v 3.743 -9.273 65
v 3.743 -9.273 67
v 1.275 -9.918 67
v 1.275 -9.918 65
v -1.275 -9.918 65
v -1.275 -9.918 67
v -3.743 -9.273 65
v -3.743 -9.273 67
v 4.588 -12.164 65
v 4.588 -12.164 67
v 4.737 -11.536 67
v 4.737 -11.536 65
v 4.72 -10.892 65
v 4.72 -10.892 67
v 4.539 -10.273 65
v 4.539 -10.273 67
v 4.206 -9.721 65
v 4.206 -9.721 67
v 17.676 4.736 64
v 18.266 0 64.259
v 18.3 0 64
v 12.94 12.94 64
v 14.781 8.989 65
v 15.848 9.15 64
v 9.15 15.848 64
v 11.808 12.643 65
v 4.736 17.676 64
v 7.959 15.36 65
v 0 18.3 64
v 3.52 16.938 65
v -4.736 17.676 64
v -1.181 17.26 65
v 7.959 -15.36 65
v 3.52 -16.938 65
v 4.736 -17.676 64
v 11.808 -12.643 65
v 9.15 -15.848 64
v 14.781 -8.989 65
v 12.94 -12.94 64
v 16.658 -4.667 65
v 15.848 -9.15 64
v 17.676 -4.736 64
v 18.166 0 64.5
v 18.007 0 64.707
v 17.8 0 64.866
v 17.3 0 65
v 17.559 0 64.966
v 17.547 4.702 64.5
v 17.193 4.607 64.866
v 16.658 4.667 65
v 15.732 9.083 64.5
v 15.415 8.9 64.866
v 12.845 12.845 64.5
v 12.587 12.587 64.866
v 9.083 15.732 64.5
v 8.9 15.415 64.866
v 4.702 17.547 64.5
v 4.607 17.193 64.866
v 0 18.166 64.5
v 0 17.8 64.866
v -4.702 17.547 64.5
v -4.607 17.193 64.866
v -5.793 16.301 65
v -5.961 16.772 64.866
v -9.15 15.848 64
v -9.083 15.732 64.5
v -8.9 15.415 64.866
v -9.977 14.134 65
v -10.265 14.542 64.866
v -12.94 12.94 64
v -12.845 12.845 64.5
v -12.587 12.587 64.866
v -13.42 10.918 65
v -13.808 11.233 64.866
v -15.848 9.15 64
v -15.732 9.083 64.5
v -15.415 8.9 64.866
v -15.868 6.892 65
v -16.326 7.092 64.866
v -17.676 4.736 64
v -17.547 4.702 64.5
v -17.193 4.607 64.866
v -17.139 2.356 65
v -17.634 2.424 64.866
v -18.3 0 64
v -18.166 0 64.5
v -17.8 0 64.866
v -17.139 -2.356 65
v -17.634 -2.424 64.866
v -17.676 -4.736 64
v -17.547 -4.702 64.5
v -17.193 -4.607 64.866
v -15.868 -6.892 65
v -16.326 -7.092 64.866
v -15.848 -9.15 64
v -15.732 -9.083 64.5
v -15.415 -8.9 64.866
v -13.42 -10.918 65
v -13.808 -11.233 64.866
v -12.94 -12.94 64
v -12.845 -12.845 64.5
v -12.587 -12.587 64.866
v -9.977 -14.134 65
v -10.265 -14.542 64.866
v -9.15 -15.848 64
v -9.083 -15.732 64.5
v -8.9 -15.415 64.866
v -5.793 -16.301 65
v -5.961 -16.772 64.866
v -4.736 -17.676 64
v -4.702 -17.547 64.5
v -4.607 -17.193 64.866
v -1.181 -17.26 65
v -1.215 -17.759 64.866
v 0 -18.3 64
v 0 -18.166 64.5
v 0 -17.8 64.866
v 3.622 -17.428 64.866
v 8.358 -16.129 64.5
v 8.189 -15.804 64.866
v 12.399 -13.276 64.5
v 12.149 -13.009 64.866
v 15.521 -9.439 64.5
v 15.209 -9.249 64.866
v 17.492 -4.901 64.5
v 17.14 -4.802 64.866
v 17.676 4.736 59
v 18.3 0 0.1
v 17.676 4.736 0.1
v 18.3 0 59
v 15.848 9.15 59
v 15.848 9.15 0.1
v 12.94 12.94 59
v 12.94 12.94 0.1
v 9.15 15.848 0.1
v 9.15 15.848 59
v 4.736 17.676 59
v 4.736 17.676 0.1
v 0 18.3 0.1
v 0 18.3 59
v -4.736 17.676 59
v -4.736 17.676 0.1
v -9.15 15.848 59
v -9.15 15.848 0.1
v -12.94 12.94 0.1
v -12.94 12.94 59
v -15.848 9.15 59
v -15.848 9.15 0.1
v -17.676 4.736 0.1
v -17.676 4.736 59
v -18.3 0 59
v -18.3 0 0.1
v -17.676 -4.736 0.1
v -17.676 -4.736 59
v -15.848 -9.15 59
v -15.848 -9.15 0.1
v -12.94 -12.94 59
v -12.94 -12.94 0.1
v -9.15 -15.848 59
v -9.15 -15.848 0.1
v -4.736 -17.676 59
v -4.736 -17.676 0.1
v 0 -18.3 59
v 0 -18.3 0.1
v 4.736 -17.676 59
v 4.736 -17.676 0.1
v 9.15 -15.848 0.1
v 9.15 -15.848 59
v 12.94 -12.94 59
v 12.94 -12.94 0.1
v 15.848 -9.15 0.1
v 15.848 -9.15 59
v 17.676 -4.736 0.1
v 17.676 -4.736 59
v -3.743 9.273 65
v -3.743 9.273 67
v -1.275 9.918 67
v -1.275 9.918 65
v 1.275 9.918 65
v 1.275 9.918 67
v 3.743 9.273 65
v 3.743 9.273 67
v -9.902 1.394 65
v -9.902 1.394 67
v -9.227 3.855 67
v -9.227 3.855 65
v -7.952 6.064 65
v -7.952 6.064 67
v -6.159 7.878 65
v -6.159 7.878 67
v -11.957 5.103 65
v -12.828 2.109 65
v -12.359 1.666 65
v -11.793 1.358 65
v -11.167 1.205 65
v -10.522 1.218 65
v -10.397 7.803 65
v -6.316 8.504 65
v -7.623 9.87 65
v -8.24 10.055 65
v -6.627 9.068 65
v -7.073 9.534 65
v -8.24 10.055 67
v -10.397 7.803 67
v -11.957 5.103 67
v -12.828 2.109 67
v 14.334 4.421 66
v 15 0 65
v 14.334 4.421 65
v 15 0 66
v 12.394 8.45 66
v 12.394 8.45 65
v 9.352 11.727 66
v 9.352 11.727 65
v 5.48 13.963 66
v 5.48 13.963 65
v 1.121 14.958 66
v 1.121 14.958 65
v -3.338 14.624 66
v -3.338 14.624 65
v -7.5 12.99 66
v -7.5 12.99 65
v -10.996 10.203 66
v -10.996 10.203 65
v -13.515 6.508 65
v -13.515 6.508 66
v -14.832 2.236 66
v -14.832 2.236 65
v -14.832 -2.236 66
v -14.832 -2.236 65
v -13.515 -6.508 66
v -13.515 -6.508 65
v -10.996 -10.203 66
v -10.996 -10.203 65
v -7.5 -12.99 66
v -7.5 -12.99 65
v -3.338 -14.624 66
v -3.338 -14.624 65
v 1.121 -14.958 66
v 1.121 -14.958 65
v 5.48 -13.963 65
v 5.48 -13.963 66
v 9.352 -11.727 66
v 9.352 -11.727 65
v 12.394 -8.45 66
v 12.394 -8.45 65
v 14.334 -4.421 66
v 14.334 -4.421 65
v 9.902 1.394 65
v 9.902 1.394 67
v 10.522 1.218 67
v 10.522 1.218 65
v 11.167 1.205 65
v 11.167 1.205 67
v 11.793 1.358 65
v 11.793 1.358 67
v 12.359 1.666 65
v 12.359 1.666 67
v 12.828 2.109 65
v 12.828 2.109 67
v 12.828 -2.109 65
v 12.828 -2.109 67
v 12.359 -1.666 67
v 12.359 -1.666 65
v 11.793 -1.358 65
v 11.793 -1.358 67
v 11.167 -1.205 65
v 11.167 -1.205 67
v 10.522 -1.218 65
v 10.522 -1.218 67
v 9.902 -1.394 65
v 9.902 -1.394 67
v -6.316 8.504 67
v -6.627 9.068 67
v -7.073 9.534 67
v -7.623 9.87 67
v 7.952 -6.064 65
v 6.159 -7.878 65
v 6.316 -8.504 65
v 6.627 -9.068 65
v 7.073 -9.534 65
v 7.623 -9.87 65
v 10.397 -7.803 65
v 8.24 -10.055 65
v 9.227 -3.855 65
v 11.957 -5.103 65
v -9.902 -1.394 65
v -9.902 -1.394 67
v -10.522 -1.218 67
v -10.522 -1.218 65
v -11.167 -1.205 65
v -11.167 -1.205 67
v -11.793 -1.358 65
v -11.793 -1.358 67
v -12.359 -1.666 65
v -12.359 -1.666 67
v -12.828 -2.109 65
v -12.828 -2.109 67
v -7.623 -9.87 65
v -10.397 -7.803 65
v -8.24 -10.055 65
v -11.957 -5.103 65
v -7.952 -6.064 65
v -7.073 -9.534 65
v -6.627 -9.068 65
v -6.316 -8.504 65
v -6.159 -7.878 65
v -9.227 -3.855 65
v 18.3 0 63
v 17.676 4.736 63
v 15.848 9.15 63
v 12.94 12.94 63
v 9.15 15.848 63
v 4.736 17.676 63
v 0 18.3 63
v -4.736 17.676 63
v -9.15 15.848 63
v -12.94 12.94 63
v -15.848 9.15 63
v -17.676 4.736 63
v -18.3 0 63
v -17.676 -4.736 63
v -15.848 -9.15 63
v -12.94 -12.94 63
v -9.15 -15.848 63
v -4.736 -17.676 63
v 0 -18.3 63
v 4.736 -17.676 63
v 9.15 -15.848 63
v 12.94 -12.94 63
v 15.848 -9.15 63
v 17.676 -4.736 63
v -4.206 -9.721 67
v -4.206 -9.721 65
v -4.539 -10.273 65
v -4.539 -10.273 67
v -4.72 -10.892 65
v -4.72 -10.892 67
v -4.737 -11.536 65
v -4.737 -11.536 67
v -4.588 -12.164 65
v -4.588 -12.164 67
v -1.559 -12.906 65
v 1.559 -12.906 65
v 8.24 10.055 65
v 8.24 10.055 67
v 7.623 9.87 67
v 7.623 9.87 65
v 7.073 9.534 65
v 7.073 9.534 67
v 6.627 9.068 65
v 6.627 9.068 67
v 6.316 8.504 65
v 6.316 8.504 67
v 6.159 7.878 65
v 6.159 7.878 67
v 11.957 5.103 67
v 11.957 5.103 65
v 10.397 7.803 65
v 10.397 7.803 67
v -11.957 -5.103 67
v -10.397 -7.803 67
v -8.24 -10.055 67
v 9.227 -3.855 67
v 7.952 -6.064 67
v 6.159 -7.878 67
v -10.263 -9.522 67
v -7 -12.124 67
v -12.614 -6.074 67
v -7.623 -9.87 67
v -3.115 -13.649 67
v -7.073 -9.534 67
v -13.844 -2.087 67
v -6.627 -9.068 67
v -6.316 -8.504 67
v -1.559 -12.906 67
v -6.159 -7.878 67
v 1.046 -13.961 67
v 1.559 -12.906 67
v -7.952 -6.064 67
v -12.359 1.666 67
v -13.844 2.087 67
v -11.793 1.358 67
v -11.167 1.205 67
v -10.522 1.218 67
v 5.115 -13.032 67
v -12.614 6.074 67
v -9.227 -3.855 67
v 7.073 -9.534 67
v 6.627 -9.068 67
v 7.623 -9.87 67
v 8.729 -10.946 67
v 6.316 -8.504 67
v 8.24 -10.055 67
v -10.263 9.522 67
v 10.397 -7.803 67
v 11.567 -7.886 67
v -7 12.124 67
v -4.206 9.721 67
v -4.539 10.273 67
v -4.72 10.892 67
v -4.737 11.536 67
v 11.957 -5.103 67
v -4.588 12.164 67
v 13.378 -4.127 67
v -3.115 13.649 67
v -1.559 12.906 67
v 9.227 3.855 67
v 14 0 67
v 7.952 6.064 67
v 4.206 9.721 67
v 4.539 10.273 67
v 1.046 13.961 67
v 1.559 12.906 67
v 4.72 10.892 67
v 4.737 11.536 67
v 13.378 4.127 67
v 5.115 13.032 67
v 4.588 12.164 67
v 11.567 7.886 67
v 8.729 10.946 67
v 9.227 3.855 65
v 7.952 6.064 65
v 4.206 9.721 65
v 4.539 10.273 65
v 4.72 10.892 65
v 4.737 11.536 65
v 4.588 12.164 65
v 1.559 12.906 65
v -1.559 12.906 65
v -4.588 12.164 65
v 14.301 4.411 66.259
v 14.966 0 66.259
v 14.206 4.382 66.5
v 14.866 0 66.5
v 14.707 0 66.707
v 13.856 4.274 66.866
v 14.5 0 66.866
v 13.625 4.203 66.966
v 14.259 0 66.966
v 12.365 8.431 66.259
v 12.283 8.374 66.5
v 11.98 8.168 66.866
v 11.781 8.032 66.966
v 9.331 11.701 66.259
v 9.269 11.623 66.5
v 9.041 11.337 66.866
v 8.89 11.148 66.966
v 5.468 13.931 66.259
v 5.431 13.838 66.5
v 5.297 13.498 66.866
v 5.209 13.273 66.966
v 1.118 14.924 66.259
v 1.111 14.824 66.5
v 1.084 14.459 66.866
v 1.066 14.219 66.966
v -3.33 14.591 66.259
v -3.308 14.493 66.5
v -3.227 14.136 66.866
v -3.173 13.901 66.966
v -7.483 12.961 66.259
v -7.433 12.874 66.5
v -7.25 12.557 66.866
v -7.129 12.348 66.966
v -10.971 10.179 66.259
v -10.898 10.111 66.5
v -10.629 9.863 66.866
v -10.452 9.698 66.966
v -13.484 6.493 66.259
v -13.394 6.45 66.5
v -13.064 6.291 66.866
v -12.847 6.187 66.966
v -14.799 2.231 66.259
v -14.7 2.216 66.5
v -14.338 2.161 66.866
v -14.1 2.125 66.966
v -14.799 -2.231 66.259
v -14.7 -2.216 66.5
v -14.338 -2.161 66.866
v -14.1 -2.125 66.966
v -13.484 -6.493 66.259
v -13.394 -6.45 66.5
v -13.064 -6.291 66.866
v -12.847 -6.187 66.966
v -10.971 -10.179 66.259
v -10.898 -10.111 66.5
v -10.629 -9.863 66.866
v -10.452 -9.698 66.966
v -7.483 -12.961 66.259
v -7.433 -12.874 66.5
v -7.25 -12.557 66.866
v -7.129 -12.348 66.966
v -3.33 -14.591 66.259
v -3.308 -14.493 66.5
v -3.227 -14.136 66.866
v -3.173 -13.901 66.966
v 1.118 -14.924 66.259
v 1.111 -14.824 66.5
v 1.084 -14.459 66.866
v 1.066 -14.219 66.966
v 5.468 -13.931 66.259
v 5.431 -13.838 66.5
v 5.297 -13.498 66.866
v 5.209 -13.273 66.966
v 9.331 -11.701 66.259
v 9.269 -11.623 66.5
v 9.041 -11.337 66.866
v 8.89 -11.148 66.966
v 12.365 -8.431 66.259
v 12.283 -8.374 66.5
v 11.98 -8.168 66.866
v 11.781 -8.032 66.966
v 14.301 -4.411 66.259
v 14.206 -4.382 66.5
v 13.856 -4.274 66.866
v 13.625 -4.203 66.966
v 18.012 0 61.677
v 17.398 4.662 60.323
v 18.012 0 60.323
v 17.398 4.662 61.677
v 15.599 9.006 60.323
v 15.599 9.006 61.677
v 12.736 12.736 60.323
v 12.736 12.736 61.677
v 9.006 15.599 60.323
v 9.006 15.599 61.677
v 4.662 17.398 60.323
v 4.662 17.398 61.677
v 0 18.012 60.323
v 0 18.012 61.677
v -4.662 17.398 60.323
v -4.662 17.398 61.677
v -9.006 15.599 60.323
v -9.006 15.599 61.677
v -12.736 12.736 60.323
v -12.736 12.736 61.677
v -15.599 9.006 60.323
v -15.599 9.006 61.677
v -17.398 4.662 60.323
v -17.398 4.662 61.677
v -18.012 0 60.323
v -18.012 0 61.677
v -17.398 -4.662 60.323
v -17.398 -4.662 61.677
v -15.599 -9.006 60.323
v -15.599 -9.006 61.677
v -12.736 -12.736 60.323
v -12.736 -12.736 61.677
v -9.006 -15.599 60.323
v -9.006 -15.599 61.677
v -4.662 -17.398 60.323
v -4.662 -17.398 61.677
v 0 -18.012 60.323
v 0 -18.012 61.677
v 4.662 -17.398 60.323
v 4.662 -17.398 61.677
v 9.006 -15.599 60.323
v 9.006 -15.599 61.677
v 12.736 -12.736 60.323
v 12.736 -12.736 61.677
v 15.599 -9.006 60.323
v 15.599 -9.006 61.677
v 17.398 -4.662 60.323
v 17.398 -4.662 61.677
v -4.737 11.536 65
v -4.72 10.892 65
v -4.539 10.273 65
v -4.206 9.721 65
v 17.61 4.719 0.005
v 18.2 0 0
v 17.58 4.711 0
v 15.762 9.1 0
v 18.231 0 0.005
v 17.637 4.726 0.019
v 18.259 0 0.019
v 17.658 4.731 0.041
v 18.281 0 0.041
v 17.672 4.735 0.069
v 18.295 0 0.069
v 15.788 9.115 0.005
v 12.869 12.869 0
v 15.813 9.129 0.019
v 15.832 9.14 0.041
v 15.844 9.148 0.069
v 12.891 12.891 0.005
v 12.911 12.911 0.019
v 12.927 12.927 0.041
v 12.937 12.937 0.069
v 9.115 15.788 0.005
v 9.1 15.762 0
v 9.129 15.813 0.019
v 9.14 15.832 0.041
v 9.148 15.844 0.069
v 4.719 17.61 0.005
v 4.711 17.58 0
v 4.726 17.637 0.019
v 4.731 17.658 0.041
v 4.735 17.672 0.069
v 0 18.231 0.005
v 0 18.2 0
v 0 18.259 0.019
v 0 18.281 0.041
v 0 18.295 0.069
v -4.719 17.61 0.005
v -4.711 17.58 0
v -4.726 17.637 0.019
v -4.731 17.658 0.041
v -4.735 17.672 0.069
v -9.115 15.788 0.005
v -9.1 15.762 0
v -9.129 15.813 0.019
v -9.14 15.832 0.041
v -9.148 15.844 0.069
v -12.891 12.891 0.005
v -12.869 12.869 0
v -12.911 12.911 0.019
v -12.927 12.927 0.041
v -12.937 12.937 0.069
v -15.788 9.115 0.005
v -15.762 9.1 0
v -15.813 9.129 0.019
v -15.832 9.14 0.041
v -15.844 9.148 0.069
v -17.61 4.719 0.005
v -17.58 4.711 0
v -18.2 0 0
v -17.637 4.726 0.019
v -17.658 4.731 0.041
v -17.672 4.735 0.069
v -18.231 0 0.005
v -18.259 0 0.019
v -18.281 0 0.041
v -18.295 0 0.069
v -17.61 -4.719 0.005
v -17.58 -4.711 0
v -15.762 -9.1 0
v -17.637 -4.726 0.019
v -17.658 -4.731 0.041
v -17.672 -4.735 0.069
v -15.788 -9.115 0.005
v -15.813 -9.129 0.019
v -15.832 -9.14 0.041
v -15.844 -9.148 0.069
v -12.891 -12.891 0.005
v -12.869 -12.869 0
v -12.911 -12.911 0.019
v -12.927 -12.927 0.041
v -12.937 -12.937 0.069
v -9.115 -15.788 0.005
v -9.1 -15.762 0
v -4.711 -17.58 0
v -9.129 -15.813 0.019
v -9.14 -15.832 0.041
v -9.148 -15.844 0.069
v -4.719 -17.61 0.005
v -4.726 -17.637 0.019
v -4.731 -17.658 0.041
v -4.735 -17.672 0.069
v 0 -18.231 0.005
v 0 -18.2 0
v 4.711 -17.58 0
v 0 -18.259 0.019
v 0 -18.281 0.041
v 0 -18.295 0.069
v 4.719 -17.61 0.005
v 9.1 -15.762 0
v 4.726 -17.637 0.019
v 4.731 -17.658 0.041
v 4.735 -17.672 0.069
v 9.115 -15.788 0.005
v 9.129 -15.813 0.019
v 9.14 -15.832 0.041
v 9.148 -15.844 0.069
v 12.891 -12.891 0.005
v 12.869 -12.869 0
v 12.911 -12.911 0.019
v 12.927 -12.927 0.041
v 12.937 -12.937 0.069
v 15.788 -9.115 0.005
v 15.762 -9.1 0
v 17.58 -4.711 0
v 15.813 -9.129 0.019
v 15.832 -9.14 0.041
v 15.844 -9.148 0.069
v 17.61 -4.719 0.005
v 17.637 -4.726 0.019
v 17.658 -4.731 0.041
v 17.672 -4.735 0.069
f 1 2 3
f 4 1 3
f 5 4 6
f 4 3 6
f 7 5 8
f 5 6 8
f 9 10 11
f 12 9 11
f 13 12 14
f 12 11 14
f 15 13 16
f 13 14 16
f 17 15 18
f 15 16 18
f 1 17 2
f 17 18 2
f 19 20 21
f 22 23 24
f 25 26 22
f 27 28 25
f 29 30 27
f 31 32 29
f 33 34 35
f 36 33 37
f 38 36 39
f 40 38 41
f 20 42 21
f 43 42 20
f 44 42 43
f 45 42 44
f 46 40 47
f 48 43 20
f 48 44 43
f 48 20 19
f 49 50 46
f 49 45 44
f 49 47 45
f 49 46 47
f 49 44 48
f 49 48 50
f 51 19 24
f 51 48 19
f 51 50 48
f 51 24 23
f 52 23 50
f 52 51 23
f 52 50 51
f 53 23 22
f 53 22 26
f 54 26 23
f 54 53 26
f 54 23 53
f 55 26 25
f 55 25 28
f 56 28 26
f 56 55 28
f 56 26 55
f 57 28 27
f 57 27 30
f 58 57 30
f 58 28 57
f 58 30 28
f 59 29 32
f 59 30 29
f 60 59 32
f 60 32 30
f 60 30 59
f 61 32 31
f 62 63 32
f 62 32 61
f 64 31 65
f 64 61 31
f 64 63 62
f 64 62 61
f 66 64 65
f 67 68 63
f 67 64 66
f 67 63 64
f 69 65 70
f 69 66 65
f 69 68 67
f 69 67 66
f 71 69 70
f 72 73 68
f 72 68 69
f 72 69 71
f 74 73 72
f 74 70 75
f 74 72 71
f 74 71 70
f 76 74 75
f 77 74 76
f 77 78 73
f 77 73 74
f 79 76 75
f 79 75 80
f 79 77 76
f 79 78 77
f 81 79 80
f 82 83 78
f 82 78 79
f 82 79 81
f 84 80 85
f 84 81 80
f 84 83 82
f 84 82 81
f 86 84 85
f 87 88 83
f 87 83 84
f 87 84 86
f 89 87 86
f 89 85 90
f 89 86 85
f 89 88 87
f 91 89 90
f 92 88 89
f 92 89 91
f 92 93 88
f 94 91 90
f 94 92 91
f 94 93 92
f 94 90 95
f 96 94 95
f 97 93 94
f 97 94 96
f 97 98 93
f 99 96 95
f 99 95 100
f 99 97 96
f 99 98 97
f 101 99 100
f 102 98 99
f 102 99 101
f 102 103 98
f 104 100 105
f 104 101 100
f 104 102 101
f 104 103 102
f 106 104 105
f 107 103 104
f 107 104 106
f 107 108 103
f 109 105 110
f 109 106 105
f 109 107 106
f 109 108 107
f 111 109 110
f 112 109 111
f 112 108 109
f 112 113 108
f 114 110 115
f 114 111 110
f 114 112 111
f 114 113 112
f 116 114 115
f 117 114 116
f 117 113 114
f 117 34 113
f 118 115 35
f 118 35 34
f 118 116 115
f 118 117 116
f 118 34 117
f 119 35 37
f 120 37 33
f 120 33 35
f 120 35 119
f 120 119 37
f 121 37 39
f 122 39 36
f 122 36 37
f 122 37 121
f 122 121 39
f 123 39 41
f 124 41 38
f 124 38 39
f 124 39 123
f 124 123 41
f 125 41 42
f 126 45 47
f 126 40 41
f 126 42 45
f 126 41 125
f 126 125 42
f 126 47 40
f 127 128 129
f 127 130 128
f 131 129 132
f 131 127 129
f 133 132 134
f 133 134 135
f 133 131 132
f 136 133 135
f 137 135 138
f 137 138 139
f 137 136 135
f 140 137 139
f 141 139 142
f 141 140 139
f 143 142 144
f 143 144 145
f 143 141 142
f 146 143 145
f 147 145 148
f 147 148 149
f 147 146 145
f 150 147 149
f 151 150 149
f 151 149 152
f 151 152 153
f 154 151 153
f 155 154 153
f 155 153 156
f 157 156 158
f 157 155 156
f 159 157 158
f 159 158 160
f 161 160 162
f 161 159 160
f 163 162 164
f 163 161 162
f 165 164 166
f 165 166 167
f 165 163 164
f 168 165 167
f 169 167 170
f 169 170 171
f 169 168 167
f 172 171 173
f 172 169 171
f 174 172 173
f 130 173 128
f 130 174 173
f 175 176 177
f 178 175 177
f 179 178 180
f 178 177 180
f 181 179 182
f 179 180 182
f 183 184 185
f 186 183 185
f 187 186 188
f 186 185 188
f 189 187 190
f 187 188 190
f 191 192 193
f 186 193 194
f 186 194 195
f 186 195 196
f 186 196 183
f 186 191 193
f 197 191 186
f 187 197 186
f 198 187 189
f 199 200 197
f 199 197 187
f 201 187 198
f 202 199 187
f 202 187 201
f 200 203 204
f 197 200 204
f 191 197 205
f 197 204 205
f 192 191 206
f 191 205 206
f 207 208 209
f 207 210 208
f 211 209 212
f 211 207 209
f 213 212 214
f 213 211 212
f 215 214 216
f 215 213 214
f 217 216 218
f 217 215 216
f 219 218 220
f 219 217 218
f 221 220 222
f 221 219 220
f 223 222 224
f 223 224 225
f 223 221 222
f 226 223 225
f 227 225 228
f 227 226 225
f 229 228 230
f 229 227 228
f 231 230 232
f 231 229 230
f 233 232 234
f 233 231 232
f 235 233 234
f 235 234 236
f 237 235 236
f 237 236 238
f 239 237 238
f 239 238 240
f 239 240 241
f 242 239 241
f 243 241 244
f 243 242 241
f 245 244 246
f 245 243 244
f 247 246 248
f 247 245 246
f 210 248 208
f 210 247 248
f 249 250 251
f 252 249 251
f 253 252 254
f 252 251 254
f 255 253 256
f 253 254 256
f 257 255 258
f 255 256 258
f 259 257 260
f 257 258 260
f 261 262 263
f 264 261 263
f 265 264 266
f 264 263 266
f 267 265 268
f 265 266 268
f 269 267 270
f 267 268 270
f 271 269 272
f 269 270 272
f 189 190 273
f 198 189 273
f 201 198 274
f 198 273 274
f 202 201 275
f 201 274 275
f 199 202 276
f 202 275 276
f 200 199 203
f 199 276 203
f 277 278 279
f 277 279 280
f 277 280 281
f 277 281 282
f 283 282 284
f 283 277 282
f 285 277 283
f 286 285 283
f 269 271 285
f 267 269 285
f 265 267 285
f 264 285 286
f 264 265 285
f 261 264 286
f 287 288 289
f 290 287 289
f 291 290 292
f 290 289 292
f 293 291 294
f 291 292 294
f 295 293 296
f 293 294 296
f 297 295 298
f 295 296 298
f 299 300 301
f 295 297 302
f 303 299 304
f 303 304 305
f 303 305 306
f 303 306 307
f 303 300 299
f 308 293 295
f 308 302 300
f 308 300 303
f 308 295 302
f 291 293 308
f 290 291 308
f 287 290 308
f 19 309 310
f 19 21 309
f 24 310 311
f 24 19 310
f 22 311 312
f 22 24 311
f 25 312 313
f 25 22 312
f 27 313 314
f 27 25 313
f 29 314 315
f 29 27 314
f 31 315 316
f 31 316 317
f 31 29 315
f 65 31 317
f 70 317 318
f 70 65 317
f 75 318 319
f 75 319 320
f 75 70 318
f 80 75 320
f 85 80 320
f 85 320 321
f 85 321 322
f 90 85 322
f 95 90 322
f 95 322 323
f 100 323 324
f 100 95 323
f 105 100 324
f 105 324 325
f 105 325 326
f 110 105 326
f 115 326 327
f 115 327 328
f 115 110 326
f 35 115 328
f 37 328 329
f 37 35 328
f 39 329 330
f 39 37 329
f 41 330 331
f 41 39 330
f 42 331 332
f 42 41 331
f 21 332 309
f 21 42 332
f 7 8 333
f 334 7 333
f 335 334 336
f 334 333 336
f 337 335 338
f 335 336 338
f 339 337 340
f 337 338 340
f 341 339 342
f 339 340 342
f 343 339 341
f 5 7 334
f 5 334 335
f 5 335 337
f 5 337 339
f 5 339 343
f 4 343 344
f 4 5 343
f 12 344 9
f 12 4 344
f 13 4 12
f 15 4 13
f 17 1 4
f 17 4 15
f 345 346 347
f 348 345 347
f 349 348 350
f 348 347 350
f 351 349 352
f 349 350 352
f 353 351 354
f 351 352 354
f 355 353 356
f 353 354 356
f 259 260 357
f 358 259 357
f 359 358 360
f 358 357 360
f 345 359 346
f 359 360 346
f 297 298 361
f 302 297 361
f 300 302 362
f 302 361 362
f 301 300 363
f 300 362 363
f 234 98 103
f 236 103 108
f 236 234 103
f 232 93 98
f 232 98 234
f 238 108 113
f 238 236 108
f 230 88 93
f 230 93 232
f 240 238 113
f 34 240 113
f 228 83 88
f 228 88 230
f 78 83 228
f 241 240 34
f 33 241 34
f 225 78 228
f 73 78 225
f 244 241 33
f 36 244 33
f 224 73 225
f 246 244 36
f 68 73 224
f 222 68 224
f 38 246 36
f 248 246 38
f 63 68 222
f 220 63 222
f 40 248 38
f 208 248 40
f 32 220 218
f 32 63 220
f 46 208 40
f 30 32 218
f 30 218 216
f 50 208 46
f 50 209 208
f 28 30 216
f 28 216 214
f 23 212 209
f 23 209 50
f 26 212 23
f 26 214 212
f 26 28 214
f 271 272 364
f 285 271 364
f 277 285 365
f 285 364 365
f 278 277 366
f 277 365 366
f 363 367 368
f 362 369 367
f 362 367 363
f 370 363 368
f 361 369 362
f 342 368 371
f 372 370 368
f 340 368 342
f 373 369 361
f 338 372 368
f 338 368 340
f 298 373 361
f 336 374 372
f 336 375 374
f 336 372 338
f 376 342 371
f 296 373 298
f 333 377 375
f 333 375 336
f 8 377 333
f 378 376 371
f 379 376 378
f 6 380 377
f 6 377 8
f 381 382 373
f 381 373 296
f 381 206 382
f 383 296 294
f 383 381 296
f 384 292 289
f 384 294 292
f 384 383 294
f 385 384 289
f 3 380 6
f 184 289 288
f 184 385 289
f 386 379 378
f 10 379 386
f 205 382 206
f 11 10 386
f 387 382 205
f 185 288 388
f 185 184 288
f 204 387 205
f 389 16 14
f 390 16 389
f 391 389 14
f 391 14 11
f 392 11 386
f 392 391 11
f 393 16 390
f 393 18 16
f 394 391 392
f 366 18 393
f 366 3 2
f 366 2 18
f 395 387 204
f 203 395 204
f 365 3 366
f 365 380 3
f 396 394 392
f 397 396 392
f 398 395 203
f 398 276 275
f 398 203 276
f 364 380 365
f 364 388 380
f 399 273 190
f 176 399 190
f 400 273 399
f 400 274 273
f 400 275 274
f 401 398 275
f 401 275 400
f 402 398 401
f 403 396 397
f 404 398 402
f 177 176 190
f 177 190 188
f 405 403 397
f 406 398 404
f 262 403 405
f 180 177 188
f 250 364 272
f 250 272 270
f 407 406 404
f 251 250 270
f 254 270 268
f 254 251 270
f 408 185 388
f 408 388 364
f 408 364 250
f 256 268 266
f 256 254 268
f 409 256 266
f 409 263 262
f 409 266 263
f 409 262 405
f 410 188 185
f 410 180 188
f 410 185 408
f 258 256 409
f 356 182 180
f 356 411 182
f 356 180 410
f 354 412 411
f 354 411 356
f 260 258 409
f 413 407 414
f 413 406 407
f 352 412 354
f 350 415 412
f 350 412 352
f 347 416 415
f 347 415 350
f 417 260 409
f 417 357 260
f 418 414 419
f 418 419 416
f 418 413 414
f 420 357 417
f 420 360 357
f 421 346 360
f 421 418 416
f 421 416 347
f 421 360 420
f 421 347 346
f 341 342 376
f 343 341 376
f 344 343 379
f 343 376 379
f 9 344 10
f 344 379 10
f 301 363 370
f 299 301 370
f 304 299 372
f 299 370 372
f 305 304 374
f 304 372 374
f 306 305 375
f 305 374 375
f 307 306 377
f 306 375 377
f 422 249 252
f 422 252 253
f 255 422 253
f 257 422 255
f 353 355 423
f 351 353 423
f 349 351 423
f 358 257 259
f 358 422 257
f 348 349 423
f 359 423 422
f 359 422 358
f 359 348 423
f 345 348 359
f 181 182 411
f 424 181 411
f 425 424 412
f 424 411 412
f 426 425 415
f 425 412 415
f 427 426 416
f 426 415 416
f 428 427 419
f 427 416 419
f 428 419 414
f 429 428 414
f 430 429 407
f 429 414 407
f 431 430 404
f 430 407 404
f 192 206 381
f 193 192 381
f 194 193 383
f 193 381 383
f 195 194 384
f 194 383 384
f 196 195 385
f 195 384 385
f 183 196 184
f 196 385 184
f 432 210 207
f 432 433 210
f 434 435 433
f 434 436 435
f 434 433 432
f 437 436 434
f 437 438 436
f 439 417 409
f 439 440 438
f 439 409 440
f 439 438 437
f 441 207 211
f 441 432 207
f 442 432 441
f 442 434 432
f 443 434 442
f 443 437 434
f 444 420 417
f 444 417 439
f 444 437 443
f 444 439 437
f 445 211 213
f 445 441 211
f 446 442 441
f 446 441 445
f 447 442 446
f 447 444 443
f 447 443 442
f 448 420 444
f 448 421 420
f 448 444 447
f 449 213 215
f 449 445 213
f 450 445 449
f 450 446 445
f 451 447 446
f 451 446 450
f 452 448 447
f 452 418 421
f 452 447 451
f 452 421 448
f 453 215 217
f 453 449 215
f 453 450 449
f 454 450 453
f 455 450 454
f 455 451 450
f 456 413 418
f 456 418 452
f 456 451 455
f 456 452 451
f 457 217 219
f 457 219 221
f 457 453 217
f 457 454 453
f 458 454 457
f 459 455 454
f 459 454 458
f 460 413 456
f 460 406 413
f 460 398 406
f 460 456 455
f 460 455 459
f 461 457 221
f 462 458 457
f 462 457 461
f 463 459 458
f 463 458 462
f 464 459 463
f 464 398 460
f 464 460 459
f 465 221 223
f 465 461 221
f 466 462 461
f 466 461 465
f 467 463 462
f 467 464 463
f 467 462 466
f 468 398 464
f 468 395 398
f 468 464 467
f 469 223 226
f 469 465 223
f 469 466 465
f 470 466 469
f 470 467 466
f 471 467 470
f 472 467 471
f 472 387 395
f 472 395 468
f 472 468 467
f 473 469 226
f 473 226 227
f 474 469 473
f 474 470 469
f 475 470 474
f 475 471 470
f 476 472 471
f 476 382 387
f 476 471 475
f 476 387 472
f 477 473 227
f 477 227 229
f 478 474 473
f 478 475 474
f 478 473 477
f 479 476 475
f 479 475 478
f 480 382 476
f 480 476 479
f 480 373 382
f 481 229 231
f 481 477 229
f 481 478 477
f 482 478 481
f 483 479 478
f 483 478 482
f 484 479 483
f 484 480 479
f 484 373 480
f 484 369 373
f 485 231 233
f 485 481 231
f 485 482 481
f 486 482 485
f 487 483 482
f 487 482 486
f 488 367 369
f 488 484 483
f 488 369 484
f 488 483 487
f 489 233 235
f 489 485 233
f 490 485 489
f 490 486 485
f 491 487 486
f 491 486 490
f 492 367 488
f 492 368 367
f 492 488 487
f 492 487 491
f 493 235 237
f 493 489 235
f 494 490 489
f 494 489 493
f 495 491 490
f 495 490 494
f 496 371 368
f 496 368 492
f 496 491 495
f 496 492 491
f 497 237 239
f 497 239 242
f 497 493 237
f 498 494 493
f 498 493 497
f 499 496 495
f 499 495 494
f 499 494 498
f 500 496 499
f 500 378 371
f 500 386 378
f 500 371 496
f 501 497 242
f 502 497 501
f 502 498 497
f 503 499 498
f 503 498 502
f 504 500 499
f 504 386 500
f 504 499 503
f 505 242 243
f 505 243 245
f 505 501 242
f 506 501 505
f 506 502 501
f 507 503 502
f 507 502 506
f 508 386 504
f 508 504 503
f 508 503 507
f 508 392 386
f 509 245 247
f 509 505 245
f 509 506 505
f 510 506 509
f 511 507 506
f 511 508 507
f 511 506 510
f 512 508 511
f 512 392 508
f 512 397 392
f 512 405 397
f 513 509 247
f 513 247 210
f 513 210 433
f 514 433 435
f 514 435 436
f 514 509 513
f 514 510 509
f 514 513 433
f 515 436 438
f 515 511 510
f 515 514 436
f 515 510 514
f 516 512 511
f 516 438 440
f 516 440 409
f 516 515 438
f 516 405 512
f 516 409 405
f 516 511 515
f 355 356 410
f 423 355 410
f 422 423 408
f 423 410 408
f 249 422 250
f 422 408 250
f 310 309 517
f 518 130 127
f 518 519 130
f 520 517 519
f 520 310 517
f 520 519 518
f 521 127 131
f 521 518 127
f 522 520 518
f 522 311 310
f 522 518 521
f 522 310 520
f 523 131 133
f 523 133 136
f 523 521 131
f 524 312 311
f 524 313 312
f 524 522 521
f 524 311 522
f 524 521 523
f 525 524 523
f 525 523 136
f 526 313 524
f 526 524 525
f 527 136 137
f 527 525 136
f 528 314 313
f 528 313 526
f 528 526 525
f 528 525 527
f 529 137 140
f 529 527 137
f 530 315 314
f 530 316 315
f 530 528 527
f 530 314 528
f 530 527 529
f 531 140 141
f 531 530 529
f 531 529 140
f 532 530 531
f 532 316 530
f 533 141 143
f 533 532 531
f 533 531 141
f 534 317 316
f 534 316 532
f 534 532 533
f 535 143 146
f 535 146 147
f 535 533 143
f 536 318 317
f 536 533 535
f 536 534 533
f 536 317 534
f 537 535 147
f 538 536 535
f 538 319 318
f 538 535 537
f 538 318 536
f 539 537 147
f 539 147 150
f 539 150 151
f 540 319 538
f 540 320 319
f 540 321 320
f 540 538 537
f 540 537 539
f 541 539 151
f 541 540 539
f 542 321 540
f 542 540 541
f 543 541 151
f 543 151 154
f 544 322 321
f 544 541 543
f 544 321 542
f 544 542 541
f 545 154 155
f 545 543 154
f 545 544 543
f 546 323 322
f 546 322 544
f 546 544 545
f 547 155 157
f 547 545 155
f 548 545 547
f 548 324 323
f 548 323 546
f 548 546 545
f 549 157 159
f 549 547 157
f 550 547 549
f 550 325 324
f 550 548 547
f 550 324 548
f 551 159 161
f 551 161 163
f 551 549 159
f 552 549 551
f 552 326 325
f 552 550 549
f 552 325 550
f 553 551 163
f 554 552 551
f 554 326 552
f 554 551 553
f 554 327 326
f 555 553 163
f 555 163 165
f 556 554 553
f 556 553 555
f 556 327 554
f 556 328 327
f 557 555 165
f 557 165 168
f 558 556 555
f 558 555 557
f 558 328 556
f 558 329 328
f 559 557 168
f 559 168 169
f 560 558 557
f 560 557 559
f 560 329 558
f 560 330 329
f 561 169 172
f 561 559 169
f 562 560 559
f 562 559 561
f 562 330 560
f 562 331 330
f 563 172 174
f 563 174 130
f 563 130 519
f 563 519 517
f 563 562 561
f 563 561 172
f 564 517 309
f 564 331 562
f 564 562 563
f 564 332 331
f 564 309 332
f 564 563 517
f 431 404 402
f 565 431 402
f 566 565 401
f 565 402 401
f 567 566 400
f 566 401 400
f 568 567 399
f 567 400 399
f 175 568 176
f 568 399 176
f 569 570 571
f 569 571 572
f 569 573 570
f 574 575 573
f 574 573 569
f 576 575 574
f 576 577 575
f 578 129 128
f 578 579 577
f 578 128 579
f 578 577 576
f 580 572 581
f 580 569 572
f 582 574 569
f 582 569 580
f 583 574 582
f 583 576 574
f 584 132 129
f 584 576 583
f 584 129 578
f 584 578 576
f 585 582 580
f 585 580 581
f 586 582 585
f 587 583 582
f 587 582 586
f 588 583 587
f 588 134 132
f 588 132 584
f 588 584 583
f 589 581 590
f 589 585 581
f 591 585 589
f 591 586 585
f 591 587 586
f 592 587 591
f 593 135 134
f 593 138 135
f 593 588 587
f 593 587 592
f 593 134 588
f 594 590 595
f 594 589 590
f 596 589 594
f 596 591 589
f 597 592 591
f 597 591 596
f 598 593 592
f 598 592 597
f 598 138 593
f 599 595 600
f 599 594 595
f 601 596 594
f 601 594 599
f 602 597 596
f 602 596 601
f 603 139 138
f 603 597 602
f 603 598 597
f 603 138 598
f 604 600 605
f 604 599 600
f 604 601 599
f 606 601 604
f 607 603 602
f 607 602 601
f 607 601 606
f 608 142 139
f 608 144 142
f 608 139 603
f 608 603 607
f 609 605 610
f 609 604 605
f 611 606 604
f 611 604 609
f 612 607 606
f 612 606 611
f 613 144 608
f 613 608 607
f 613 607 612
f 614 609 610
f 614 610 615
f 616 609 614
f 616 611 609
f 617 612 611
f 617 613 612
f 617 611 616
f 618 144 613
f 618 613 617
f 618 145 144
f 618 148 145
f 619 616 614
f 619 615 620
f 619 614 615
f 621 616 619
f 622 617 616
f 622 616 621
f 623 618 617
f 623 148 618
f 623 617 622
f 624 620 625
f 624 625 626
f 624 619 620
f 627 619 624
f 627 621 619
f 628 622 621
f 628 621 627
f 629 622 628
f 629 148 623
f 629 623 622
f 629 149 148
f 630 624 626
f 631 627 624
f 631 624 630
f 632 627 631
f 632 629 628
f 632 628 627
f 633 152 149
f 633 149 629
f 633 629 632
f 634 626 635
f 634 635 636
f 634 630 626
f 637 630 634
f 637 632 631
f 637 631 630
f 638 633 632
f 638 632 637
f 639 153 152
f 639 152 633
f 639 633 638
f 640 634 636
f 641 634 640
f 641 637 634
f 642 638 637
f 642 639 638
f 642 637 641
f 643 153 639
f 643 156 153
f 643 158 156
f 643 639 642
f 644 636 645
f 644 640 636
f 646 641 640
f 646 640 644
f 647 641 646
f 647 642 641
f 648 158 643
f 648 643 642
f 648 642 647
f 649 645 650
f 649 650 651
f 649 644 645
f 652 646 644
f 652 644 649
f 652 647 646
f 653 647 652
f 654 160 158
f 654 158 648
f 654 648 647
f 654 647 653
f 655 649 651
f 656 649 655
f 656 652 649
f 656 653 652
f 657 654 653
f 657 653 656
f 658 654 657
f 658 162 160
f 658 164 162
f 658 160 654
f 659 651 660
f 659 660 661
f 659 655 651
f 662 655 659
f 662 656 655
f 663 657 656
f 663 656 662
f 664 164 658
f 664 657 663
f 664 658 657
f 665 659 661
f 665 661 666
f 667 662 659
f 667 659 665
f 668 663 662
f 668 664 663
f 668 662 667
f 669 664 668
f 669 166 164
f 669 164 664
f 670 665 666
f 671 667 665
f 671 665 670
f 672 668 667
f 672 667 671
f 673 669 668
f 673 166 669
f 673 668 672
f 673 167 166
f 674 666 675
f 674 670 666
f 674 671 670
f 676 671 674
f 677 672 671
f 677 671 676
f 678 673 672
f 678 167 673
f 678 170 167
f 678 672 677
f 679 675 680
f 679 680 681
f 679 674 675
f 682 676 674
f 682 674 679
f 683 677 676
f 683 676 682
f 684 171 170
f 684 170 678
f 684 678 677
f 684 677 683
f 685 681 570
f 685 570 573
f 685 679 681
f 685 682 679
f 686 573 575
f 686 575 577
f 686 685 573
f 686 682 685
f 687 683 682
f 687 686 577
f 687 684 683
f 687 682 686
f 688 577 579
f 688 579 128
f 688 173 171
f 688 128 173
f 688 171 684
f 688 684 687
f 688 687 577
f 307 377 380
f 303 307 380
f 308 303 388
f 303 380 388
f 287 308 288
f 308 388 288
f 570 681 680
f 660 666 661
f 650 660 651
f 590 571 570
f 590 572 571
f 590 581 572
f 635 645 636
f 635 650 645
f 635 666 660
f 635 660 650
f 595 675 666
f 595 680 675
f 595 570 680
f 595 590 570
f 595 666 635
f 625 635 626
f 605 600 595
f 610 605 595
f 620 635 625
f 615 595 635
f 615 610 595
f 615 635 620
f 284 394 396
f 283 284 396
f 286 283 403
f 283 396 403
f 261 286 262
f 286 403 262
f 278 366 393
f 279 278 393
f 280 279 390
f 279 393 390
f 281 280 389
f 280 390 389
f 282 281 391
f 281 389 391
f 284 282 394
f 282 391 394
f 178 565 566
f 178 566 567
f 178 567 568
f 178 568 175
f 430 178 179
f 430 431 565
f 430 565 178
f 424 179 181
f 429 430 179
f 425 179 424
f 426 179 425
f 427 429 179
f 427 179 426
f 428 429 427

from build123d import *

# Parameters (mm, degrees)
F4_DEPTH = 2


# Not quite as in the source:
# - a feature of the source that left no trace in its solid (it failed there, or was rolled back) is left out


with BuildPart() as f2:
    # F1 (on Front) → F2 (revolve)
    with BuildSketch(Plane.XZ):
        with BuildLine():
            Line((0, 67), (0, 65))
            Line((0, 65), (15, 65))
            Line((15, 65), (15, 66))
            ThreePointArc((15, 66), (14.7071067812, 66.7071067812), (14, 67))
            Line((14, 67), (0, 67))
        make_face()
        with BuildLine():
            Line((0, 65), (0, 0))
            Line((0, 0), (18.2, 0))
            ThreePointArc((18.2, 0), (18.2707106781, 0.0292893219), (18.3, 0.1))
            Line((18.3, 0.1), (18.3, 59))
            ThreePointArc((18.3, 59), (17.9754446797, 61), (18.3, 63))
            Line((18.3, 63), (18.3, 64))
            ThreePointArc((18.3, 64), (18.0071067812, 64.7071067812), (17.3, 65))
            Line((17.3, 65), (15, 65))
            Line((15, 65), (0, 65))
        make_face()
    revolve(axis=Axis((0, 0, 33.5), (0, 0, 1)))

    # F3 (on face) → F4 (cut)
    with BuildSketch(Plane.XY.offset(67)):
        with BuildLine():
            ThreePointArc((-6.1588027163, 7.8783976227), (-6.8349323024, 9.3151975073), (-8.240042652, 10.0549339676))
            ThreePointArc((-8.240042652, 10.0549339676), (-11.2583302492, 6.5), (-12.8278495753, 2.1086192811))
            ThreePointArc((-12.8278495753, 2.1086192811), (-11.4846638338, 1.2616262534), (-9.9022938405, 1.3944807979))
            ThreePointArc((-9.9022938405, 1.3944807979), (-8.6602540378, 5), (-6.1588027163, 7.8783976227))
        make_face()
        with BuildLine():
            ThreePointArc((-3.7434911242, 9.2728784206), (0, 10), (3.7434911242, 9.2728784206))
            ThreePointArc((3.7434911242, 9.2728784206), (4.6497315314, 10.5768237606), (4.5878069233, 12.1635532487))
            ThreePointArc((4.5878069233, 12.1635532487), (0, 13), (-4.5878069233, 12.1635532487))
            ThreePointArc((-4.5878069233, 12.1635532487), (-4.6497315314, 10.5768237606), (-3.7434911242, 9.2728784206))
        make_face()
        with BuildLine():
            ThreePointArc((-9.9022938405, -1.3944807979), (-11.4846638338, -1.2616262534), (-12.8278495753, -2.1086192811))
            ThreePointArc((-12.8278495753, -2.1086192811), (-11.2583302492, -6.5), (-8.240042652, -10.0549339676))
            ThreePointArc((-8.240042652, -10.0549339676), (-6.8349323024, -9.3151975073), (-6.1588027163, -7.8783976227))
            ThreePointArc((-6.1588027163, -7.8783976227), (-8.6602540378, -5), (-9.9022938405, -1.3944807979))
        make_face()
        with BuildLine():
            ThreePointArc((-3.7434911242, -9.2728784206), (-4.6497315314, -10.5768237606), (-4.5878069233, -12.1635532487))
            ThreePointArc((-4.5878069233, -12.1635532487), (0, -13), (4.5878069233, -12.1635532487))
            ThreePointArc((4.5878069233, -12.1635532487), (4.6497315314, -10.5768237606), (3.7434911242, -9.2728784206))
            ThreePointArc((3.7434911242, -9.2728784206), (0, -10), (-3.7434911242, -9.2728784206))
        make_face()
        with BuildLine():
            ThreePointArc((6.1588027163, -7.8783976227), (6.8349323024, -9.3151975073), (8.240042652, -10.0549339676))
            ThreePointArc((8.240042652, -10.0549339676), (11.2583302492, -6.5), (12.8278495753, -2.1086192811))
            ThreePointArc((12.8278495753, -2.1086192811), (11.4846638338, -1.2616262534), (9.9022938405, -1.3944807979))
            ThreePointArc((9.9022938405, -1.3944807979), (8.6602540378, -5), (6.1588027163, -7.8783976227))
        make_face()
        with BuildLine():
            ThreePointArc((9.9022938405, 1.3944807979), (11.4846638338, 1.2616262534), (12.8278495753, 2.1086192811))
            ThreePointArc((12.8278495753, 2.1086192811), (11.2583302492, 6.5), (8.240042652, 10.0549339676))
            ThreePointArc((8.240042652, 10.0549339676), (6.8349323024, 9.3151975073), (6.1588027163, 7.8783976227))
            ThreePointArc((6.1588027163, 7.8783976227), (8.6602540378, 5), (9.9022938405, 1.3944807979))
        make_face()
    extrude(amount=-F4_DEPTH, mode=Mode.SUBTRACT)


solid = f2.part
